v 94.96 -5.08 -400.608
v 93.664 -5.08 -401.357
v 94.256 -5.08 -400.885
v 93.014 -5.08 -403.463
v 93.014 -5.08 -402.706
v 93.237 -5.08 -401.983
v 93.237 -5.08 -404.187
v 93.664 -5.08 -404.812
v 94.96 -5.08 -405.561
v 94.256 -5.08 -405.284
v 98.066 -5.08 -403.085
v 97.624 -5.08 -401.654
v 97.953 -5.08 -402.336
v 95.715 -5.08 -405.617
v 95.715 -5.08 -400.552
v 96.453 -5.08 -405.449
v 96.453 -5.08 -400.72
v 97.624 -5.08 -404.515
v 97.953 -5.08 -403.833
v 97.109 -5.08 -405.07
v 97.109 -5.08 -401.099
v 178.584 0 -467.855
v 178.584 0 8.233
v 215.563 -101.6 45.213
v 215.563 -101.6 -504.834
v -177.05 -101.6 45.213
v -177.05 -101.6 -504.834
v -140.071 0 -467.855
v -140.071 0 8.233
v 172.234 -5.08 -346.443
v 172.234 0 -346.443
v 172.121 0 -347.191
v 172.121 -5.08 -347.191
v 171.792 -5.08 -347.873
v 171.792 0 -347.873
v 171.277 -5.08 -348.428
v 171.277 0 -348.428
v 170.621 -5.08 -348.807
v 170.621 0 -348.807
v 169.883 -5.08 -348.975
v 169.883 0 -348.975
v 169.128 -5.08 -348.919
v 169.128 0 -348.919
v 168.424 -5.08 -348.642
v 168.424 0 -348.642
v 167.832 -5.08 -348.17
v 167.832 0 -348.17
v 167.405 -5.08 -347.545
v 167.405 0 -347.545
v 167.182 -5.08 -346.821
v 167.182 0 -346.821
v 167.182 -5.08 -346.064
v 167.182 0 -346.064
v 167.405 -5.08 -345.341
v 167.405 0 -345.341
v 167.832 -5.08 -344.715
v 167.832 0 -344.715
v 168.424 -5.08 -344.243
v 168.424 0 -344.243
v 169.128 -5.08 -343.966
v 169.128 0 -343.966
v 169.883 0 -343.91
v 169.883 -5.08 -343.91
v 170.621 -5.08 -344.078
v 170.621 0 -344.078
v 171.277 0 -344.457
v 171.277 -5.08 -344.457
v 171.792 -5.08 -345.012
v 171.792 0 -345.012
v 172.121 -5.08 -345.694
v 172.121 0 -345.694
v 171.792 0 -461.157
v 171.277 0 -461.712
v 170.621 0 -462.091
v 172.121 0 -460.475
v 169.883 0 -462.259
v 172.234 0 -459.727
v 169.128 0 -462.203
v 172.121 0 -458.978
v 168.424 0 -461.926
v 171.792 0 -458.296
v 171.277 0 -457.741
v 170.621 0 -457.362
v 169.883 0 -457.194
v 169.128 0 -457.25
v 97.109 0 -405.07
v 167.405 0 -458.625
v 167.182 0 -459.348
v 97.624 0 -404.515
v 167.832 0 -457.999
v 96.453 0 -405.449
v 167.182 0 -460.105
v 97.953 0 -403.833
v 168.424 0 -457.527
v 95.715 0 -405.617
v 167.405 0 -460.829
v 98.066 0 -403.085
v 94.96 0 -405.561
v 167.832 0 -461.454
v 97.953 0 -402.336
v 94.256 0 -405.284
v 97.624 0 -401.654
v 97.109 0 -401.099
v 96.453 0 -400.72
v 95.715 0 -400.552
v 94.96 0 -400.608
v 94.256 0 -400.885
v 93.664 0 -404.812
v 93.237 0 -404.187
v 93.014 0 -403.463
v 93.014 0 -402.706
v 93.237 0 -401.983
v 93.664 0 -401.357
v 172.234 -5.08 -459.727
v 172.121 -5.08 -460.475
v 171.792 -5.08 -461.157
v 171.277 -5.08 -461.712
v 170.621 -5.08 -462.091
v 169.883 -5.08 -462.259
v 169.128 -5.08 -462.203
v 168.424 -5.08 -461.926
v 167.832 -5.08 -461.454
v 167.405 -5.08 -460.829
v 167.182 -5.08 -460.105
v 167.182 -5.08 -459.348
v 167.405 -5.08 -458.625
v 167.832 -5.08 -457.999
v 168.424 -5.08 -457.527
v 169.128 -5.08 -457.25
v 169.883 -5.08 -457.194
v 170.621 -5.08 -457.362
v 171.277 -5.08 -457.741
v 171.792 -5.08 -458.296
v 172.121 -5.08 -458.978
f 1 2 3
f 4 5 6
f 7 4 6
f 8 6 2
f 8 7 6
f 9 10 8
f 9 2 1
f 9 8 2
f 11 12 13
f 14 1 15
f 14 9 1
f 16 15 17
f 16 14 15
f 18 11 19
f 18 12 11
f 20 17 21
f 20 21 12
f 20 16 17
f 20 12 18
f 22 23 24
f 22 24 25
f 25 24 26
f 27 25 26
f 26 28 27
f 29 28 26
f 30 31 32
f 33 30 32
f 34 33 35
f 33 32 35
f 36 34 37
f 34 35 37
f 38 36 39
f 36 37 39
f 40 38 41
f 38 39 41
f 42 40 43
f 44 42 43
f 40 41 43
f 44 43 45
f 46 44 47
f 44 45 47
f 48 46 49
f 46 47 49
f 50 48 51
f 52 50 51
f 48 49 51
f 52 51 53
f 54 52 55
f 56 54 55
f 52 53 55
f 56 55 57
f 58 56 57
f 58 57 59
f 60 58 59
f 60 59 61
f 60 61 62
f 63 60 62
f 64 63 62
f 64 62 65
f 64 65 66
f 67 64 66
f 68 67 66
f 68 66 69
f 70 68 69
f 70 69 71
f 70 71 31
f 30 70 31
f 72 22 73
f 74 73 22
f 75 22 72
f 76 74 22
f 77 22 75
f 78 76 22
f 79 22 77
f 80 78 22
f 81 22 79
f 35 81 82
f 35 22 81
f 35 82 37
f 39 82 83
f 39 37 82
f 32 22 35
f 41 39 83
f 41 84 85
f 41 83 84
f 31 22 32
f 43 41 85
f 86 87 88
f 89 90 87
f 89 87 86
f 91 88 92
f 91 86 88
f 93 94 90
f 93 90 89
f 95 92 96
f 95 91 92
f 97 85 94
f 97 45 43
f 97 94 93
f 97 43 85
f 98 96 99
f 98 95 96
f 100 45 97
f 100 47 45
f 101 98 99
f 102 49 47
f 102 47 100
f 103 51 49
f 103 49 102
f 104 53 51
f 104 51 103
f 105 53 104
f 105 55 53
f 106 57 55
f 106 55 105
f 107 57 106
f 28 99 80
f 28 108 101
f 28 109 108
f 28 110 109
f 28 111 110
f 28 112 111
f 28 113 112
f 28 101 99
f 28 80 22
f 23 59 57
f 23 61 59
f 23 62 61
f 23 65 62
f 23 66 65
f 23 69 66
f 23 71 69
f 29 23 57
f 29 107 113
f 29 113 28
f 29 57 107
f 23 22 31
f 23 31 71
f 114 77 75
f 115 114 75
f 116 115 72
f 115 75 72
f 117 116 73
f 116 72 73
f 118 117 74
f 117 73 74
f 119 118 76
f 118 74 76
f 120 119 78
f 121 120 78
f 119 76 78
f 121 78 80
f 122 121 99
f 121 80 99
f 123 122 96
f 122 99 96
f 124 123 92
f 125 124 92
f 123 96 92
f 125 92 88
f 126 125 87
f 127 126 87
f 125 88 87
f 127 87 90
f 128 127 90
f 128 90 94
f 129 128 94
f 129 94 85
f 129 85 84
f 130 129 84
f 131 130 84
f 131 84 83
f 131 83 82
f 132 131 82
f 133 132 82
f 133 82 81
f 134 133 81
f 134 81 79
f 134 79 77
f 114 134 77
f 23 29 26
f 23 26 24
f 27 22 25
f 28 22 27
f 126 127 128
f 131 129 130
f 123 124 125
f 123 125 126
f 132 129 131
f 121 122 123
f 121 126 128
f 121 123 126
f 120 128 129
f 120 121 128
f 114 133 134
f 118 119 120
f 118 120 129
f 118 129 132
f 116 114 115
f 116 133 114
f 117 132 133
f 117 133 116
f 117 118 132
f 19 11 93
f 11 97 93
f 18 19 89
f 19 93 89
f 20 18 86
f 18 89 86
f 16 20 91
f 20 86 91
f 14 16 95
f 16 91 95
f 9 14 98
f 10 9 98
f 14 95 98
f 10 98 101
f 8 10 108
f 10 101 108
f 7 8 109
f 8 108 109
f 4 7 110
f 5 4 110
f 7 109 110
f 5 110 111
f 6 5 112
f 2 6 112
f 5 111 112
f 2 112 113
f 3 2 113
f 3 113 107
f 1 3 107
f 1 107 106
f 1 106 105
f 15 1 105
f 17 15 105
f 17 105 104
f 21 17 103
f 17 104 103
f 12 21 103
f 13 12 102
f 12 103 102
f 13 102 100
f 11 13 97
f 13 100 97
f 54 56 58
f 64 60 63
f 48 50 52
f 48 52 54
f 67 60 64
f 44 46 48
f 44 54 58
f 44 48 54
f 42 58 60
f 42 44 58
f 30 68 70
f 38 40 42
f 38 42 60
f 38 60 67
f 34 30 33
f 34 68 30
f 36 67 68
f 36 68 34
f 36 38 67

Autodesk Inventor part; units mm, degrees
ref_plane "YZ Plane" through (0, 0, 0) normal (1, 0, 0) x (0, 1, 0)
ref_plane "XZ Plane" through (0, 0, 0) normal (0, 1, 0) x (-1, 0, 0)
ref_plane "XY Plane" through (0, 0, 0) normal (0, 0, 1) x (1, 0, 0)
sketch "Sketch1" plane through (0, 0, 0) normal (0, 1, 0) x (-1, 0, 0)
  line L0 (0, 0) -> (0, -129.54)
  line L1 (0, 0) -> (99.06, 0)
  line L2 (99.06, 0) -> (99.06, -129.54)
  line L3 (99.06, -129.54) -> (0, -129.54)
  line L4 (140.0707, 45.2128) -> (-215.5629, 45.2128)
  line L5 (-215.5629, 45.2128) -> (-215.5629, -504.8339)
  line L6 (-215.5629, -504.8339) -> (140.0707, -504.8339)
  line L7 (140.0707, -504.8339) -> (140.0707, 45.2128)
  dimension "d0" = 129.54
  dimension "d1" = 99.06
extrude "Extrusion1" add sketch "Sketch1" against normal blind 101.6 contours L1 L2 L3 L0 | L7 L6 L5 L4
draft "FaceDraft1" angle -20 pull direction (0, -1, 0) faces at (215.5629, -33.8667, -138.1361) (-21.5262, -33.8667, 45.2128) fixed edges at (215.5629, -101.6, -229.8106) (37.7461, -101.6, 45.2128)
draft "FaceDraft2" angle -20 pull direction (0, -1, 0) faces at (-140.0707, -67.7333, -150.4626) (84.6919, -67.7333, -504.8339) fixed edges at (-140.0707, 0, -248.3003) (37.7461, -101.6, -504.8339)
sketch "Sketch2" plane through (0, 0, 0) normal (0, 1, 0) x (1, 0, 0)
  line L0 (178.5835, 467.8546) -> (215.5629, 504.8339) projected
  line L1 (178.5835, 467.8546) -> (79.5235, 467.8546)
  line L2 (79.5235, 467.8546) -> (79.5235, 338.3146)
  line L3 (79.5235, 338.3146) -> (178.5835, 338.3146)
  line L4 (178.5835, 338.3146) -> (178.5835, 467.8546)
  line L5 (178.5835, 338.3146) -> (178.5835, 346.4426)
  line L6 (178.5835, -8.2334) -> (178.5835, 467.8546) projected
  line L7 (178.5835, 467.8546) -> (178.5835, 459.7266)
  circle A0 centre (95.5255, 403.0846) radius 2.54
  circle A1 centre (169.6935, 346.4426) radius 2.54
  circle A2 centre (169.6935, 459.7266) radius 2.54
  point P0 (0, 0)
  dimension "d6" = 99.06
  dimension "d7" = 129.54
  dimension "d13" = 5.08
  dimension "d14" = 5.08
  dimension "d15" = 5.08
extrude "Extrusion2" cut sketch "Sketch2" against normal blind 5.08 contours A0 | A1 | A2
equation "\"d16\" = d14"
properties part number "Base"
